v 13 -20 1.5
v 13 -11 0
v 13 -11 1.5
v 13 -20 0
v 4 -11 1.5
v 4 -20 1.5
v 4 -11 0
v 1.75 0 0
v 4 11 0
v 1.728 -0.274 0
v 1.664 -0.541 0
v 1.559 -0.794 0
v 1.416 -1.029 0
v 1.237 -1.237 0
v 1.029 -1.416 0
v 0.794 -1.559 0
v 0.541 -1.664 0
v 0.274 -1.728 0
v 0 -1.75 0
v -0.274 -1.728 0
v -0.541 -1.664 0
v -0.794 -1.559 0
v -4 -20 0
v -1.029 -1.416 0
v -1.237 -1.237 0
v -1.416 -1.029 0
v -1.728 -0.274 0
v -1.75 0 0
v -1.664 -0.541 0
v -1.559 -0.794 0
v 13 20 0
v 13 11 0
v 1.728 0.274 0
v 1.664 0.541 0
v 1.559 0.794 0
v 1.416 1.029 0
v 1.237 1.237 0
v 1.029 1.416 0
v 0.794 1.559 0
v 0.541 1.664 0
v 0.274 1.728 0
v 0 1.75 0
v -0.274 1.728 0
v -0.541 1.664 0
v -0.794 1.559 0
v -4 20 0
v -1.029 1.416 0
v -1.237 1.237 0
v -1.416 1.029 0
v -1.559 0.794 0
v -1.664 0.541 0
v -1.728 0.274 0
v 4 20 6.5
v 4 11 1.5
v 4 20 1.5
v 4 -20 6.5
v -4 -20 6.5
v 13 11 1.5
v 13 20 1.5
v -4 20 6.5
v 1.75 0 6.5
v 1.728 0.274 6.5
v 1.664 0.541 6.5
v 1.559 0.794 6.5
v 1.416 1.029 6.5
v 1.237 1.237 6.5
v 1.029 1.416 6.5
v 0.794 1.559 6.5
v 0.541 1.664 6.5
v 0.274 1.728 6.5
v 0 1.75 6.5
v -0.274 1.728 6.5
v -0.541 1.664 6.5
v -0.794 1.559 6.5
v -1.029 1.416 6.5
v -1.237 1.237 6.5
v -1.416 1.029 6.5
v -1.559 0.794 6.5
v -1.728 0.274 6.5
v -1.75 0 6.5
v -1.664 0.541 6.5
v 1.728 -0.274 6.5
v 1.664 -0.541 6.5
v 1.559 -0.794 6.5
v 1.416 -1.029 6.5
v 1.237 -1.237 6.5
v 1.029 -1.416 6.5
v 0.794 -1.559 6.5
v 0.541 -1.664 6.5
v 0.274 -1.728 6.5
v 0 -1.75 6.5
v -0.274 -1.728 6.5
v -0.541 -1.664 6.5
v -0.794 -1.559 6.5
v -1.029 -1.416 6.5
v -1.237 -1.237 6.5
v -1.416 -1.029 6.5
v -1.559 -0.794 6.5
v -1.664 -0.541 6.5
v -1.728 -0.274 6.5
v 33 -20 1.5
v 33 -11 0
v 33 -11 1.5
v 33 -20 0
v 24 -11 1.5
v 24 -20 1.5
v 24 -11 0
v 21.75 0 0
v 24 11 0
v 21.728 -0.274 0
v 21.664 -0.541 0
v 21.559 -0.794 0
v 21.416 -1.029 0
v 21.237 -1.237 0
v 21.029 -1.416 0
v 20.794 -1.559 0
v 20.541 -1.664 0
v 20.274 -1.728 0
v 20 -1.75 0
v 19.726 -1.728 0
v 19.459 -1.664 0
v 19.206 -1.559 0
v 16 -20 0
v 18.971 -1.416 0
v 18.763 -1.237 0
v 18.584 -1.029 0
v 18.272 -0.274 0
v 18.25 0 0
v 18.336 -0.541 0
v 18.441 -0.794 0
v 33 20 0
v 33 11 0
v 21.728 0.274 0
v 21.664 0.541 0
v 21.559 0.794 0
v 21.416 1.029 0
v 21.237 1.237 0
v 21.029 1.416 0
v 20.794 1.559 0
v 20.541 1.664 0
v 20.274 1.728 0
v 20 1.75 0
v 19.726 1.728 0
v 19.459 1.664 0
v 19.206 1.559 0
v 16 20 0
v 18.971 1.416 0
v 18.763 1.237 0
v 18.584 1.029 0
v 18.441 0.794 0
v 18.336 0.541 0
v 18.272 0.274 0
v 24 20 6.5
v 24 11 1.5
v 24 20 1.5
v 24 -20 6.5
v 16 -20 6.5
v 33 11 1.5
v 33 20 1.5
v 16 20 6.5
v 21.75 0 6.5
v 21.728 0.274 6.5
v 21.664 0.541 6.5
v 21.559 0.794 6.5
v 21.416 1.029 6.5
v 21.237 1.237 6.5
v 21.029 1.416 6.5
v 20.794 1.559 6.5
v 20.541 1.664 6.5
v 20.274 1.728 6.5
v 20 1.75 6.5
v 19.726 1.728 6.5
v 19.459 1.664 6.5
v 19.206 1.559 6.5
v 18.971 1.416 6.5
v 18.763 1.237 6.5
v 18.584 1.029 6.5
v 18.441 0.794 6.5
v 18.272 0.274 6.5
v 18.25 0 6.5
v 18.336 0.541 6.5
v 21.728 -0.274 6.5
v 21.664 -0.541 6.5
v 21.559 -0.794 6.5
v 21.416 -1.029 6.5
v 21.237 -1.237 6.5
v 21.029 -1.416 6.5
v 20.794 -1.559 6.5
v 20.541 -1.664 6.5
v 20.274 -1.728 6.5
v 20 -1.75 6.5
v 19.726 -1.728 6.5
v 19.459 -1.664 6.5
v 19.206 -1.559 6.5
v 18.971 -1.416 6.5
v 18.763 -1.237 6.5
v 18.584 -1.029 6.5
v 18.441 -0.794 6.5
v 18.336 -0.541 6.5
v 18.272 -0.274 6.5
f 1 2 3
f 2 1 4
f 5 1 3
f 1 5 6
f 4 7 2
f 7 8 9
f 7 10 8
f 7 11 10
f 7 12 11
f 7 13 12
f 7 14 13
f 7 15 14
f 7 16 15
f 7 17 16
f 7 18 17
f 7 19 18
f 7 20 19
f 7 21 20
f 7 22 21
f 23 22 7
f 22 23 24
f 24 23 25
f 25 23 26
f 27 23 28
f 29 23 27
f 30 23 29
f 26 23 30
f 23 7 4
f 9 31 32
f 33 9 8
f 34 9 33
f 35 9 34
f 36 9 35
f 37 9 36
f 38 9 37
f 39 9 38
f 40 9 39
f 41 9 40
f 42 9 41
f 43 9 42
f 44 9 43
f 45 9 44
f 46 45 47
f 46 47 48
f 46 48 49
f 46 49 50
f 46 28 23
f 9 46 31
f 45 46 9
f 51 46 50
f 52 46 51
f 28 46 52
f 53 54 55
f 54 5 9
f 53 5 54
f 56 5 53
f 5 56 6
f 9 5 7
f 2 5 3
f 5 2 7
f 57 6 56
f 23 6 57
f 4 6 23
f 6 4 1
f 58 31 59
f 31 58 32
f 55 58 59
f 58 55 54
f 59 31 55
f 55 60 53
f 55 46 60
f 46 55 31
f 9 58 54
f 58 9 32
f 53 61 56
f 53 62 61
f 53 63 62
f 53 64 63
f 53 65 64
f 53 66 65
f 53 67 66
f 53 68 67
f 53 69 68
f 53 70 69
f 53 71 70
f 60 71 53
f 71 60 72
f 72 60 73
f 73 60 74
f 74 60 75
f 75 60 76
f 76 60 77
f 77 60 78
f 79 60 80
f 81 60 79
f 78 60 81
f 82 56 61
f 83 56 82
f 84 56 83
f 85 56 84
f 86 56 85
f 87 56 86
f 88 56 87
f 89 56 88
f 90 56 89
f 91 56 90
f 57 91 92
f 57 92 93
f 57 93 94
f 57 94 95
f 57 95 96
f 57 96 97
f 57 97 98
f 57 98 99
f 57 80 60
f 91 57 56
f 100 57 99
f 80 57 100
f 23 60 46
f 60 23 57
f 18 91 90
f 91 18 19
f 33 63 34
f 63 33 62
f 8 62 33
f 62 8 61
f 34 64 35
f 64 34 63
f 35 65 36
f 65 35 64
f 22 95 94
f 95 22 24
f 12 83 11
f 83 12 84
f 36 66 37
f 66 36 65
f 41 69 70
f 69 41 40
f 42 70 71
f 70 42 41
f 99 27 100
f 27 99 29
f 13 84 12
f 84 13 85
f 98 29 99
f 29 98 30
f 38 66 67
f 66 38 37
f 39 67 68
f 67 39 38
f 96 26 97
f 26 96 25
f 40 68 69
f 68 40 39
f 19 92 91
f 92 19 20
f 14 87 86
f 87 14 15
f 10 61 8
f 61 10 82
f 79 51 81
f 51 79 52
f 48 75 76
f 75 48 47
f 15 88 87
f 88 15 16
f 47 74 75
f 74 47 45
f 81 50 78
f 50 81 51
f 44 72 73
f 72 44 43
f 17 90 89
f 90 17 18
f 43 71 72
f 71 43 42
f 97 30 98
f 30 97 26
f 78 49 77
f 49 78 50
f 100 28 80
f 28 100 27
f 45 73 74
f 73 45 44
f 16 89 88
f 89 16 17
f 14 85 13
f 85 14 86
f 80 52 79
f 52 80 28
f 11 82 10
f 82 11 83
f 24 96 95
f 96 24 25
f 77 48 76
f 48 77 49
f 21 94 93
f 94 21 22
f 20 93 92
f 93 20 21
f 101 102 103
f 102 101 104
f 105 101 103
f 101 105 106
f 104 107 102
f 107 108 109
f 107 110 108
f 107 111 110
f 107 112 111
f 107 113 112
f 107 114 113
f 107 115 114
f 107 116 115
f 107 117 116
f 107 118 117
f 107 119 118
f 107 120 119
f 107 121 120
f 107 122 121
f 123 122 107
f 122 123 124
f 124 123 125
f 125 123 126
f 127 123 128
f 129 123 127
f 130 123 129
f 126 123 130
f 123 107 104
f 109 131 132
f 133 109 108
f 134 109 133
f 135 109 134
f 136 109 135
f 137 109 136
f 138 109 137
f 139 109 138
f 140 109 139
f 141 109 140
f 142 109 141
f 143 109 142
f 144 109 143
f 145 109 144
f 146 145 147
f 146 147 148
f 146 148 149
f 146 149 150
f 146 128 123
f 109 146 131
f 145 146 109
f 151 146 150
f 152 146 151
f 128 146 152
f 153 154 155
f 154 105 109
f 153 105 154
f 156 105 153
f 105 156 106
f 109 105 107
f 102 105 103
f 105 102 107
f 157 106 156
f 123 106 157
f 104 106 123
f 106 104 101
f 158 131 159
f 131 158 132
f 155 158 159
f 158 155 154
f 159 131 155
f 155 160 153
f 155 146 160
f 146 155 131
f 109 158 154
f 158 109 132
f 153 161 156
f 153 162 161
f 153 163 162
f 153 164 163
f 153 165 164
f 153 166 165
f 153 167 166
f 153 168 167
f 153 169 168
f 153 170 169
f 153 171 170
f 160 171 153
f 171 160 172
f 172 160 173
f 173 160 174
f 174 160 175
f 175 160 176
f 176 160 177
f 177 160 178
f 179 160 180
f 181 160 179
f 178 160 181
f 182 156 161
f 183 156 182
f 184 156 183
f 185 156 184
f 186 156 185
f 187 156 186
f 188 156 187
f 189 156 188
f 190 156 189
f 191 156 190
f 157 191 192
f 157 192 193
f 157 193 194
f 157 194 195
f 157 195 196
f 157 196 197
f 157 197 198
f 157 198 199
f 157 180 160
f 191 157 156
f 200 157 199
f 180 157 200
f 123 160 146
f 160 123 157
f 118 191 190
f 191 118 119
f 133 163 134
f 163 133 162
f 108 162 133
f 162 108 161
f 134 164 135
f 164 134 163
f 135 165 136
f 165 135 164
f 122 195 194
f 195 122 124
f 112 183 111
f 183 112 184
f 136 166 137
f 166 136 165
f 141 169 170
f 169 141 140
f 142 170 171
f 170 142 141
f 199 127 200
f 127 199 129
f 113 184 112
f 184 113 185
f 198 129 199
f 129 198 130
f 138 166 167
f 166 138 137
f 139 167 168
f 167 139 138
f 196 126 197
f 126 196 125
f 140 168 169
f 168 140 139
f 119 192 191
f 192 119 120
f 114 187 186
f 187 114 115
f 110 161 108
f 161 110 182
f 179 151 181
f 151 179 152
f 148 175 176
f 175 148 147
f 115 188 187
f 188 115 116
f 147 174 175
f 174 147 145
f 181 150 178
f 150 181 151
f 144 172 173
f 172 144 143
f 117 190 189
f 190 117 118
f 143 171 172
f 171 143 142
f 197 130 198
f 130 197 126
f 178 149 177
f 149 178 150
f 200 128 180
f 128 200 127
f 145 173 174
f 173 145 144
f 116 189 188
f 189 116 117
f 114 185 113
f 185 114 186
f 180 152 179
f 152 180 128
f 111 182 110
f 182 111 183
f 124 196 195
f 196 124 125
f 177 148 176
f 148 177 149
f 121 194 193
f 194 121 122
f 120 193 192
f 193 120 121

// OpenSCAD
eps = 0.01;
N = 2;
M = 1;

module ecd_holder()
{
  difference()
  {
    translate([-8/2, -40/2, 0])
    {
      cube([8, 40, 5+1.5]);
      for(dy=[0, 40-9])
        translate([8, dy, 0])
          cube([9, 9, 1.5]);
    }
    // screw hole
    translate([0, 0, -eps])
      cylinder(d=3.5, h=10, $fn=40);
  }
}

for(iy=[0:M-1])
  for(ix=[0:N-1])
    translate([ix*20, iy*45, 0])
      ecd_holder();
